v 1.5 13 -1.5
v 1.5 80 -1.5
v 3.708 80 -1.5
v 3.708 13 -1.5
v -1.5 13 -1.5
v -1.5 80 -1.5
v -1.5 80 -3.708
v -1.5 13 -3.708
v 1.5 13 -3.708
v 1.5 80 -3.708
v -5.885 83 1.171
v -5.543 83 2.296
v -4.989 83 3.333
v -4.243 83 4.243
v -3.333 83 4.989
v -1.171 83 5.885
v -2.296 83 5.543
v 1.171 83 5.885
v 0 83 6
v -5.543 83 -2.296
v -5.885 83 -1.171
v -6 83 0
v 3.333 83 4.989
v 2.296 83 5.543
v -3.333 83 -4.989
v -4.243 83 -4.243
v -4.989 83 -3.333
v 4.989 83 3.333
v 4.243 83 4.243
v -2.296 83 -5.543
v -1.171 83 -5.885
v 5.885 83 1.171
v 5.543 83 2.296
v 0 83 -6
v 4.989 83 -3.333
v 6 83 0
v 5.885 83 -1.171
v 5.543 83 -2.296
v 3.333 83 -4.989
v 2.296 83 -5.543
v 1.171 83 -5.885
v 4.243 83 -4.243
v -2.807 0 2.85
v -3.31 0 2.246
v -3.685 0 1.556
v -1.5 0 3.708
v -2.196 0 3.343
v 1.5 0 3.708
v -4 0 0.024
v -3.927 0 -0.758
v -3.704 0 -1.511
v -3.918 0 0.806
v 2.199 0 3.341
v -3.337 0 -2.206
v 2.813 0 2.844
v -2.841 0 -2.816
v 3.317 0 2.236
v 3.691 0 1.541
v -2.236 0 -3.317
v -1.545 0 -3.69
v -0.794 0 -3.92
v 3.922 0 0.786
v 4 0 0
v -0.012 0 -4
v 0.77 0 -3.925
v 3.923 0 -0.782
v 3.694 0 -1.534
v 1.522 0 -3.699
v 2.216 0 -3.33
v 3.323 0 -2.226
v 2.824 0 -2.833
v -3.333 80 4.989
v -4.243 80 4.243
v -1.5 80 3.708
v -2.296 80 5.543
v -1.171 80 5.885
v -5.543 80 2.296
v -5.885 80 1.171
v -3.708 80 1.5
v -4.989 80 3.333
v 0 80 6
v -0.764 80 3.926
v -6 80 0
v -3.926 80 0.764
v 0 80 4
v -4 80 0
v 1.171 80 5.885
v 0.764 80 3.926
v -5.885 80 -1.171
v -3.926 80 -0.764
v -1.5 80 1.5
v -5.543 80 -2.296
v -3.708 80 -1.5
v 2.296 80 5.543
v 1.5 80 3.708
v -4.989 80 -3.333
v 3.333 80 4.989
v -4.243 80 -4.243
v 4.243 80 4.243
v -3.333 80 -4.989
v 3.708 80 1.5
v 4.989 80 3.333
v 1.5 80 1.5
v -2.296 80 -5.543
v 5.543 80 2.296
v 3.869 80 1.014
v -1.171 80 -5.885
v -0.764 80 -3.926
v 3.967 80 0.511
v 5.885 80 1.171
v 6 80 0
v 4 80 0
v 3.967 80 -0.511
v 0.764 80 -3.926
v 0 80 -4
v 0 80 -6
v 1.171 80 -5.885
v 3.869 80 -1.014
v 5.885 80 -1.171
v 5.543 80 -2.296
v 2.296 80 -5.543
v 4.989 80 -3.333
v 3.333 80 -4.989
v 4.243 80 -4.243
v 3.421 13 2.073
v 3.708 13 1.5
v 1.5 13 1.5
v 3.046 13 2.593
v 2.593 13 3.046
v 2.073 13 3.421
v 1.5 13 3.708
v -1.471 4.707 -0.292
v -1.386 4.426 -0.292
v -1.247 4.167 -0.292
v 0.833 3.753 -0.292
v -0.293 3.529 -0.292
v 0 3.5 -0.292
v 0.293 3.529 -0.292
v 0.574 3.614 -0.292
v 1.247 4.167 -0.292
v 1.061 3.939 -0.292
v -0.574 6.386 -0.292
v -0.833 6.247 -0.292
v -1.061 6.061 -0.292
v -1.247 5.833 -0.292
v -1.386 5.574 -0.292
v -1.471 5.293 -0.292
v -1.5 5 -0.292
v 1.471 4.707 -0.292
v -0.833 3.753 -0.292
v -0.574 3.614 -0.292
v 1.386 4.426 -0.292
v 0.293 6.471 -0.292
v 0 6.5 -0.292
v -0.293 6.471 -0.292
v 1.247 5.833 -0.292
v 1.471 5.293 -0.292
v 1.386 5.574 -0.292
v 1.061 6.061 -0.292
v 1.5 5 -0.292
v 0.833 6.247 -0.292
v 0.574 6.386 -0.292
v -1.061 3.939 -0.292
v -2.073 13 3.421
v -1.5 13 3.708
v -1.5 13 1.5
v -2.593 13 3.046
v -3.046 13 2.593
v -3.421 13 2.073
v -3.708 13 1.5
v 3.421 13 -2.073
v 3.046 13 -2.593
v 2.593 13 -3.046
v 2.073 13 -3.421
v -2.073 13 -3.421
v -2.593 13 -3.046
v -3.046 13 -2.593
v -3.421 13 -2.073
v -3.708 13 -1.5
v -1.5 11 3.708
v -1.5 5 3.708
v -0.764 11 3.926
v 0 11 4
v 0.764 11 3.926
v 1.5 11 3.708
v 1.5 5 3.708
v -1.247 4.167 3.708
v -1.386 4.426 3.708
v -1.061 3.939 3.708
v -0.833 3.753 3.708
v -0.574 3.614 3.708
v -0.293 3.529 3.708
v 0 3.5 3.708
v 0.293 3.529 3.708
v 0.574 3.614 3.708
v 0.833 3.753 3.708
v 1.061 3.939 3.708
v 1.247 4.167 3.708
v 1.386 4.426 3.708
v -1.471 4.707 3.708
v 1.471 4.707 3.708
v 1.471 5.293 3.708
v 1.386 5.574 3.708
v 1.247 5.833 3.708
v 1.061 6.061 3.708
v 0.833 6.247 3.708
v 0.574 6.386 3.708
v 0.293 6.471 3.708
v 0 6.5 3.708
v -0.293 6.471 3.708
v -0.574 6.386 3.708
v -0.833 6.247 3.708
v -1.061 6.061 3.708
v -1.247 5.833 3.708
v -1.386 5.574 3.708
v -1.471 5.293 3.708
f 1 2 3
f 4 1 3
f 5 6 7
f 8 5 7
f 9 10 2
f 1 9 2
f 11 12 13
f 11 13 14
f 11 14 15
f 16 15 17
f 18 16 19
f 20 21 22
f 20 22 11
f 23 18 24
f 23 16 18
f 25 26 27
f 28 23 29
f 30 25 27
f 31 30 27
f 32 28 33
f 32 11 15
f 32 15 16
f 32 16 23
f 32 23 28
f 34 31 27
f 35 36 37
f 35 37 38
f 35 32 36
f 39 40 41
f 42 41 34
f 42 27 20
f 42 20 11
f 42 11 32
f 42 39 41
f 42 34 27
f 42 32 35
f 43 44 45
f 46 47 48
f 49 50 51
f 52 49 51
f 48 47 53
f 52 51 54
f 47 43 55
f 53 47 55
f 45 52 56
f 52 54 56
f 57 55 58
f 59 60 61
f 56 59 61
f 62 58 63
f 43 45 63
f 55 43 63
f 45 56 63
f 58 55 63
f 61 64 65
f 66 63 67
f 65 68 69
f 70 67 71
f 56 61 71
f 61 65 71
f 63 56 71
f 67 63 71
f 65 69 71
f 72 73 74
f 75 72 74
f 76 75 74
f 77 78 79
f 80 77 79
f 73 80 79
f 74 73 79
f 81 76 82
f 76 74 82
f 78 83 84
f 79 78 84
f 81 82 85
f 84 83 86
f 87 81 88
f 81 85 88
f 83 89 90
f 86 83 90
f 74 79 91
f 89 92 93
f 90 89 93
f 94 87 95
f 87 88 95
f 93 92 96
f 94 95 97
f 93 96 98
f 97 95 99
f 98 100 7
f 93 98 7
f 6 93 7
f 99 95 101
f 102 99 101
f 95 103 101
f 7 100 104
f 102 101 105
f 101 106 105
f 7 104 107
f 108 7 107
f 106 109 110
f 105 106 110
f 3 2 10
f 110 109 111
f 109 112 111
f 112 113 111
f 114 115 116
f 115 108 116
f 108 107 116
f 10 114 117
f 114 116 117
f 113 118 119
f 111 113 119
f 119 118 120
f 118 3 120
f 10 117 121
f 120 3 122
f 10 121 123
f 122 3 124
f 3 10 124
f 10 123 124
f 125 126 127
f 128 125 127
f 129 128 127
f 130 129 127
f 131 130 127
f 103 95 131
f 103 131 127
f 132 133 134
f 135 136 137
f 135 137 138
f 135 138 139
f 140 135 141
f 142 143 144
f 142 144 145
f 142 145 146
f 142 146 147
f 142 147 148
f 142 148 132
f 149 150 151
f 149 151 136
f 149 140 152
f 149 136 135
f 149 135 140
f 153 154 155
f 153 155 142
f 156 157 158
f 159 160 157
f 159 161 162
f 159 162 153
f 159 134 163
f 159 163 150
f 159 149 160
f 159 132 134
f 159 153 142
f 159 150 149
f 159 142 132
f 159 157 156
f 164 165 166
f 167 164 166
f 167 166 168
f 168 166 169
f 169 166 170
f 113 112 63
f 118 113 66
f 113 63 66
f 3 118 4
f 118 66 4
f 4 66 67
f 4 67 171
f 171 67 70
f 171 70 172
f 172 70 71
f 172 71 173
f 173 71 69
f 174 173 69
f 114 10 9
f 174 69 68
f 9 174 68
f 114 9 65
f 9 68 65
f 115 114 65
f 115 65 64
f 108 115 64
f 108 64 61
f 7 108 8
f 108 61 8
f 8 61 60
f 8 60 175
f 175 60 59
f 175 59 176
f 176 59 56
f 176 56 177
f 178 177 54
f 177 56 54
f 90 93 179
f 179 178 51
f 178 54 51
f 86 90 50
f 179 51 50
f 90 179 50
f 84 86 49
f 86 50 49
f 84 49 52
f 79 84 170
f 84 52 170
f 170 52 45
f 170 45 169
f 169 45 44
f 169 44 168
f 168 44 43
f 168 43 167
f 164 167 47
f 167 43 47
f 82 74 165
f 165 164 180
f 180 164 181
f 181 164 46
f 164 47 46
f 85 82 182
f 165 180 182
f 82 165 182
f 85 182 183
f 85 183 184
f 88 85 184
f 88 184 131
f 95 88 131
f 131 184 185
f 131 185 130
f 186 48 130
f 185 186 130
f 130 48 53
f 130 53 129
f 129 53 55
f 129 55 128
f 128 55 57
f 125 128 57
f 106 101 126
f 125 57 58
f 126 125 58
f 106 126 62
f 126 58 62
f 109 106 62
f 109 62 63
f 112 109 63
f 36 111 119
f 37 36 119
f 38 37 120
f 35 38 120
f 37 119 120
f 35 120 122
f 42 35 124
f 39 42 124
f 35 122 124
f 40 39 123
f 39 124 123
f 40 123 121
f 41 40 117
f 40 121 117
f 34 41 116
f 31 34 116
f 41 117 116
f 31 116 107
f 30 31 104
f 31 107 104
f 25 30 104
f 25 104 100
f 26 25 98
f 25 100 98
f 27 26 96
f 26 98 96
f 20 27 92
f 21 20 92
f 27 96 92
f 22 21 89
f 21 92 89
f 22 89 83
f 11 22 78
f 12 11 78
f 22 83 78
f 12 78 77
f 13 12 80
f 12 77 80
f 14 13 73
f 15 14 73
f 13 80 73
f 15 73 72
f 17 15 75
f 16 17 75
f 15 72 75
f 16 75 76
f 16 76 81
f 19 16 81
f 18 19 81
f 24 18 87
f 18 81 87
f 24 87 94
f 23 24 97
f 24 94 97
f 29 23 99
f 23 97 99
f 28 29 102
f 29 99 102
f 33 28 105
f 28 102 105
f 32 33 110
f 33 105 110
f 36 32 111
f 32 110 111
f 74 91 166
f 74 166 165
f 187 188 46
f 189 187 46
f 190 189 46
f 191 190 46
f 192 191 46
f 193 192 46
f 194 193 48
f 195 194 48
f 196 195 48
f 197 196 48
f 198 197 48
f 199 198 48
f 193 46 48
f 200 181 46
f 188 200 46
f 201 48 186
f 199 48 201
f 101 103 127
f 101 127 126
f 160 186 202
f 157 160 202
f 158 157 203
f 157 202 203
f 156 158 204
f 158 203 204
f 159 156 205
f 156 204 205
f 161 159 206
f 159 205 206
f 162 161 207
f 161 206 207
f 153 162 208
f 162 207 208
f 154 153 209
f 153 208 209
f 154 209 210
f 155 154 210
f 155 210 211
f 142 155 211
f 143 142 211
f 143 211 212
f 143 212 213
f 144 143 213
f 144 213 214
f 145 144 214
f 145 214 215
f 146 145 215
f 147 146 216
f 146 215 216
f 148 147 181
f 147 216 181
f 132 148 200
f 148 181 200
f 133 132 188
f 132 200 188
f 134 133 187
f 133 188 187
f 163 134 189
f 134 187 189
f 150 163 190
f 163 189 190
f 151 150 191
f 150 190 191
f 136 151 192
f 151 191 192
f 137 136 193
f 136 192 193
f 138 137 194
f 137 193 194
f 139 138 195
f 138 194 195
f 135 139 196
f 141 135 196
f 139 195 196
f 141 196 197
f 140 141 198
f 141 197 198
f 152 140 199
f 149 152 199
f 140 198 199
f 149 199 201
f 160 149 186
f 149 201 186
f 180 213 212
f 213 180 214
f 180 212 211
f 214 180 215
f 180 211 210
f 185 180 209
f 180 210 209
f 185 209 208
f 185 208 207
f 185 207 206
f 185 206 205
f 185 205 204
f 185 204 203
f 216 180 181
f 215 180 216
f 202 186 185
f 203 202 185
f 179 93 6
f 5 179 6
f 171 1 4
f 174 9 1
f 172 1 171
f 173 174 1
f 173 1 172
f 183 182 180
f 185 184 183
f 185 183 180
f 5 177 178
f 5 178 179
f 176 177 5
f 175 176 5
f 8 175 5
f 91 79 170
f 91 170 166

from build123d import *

# Parameters (mm, degrees)
SKETCH1_R           = 4
BOSS_EXTRUDE1_DEPTH = 80
CUT_EXTRUDE1_DEPTH  = 11
SKETCH3_R           = 1.5
CUT_EXTRUDE2_DEPTH  = 4
CUT_EXTRUDE3_DEPTH  = 67
SKETCH5_R           = 6
BOSS_EXTRUDE2_DEPTH = 3


with BuildPart() as part:
    # Sketch1 → Boss-Extrude1 (new body)
    with BuildSketch(Plane(origin=(0, 0, 0), x_dir=(1, 0, 0), z_dir=(0, 1, 0))):
        Circle(SKETCH1_R)
    extrude(amount=BOSS_EXTRUDE1_DEPTH)

    # Sketch2 → Cut-Extrude1 (cut)
    with BuildSketch(Plane.XZ):
        with BuildLine():
            Line((-1.5, 3.708099244), (1.5, 3.708099244))
            ThreePointArc((1.5, 3.708099244), (0, 4), (-1.5, 3.708099244))
        make_face()
    extrude(amount=-CUT_EXTRUDE1_DEPTH, mode=Mode.SUBTRACT)

    # Sketch3 → Cut-Extrude2 (cut)
    with BuildSketch(Plane.XY.offset(3.708099244)):
        with Locations((0, 5)):
            Circle(SKETCH3_R)
    extrude(amount=-CUT_EXTRUDE2_DEPTH, mode=Mode.SUBTRACT)

    # Sketch4 → Cut-Extrude3 (cut)
    with BuildSketch(Plane(origin=(0, 80, 0), x_dir=(1, 0, 0), z_dir=(0, 1, 0))):
        with BuildLine():
            Line((-1.5, -3.586397938), (-1.5, -3.708099244))
            ThreePointArc((-1.5, -3.708099244), (-2.828427125, -2.828427125), (-3.708099244, -1.5))
            Line((-3.708099244, -1.5), (-1.5, -1.5))
            Line((-1.5, -1.5), (-1.5, -3.586397938))
        make_face()
        with BuildLine():
            Line((-3.708099244, 1.5), (-1.5, 1.5))
            Line((-1.5, 1.5), (-1.5, 3.708099244))
            ThreePointArc((-1.5, 3.708099244), (-2.828427125, 2.828427125), (-3.708099244, 1.5))
        make_face()
        with BuildLine():
            Line((1.5, 3.708099244), (1.5, 1.5))
            Line((1.5, 1.5), (3.708099244, 1.5))
            ThreePointArc((3.708099244, 1.5), (2.828427125, 2.828427125), (1.5, 3.708099244))
        make_face()
        with BuildLine():
            Line((1.5, -3.708099244), (1.5, -1.5))
            Line((1.5, -1.5), (3.708099244, -1.5))
            ThreePointArc((3.708099244, -1.5), (2.828427125, -2.828427125), (1.5, -3.708099244))
        make_face()
    extrude(amount=-CUT_EXTRUDE3_DEPTH, mode=Mode.SUBTRACT)

    # Sketch5 → Boss-Extrude2 (add)
    with BuildSketch(Plane(origin=(0, 80, 0), x_dir=(1, 0, 0), z_dir=(0, 1, 0))):
        Circle(SKETCH5_R)
    extrude(amount=BOSS_EXTRUDE2_DEPTH)


solid = part.part
